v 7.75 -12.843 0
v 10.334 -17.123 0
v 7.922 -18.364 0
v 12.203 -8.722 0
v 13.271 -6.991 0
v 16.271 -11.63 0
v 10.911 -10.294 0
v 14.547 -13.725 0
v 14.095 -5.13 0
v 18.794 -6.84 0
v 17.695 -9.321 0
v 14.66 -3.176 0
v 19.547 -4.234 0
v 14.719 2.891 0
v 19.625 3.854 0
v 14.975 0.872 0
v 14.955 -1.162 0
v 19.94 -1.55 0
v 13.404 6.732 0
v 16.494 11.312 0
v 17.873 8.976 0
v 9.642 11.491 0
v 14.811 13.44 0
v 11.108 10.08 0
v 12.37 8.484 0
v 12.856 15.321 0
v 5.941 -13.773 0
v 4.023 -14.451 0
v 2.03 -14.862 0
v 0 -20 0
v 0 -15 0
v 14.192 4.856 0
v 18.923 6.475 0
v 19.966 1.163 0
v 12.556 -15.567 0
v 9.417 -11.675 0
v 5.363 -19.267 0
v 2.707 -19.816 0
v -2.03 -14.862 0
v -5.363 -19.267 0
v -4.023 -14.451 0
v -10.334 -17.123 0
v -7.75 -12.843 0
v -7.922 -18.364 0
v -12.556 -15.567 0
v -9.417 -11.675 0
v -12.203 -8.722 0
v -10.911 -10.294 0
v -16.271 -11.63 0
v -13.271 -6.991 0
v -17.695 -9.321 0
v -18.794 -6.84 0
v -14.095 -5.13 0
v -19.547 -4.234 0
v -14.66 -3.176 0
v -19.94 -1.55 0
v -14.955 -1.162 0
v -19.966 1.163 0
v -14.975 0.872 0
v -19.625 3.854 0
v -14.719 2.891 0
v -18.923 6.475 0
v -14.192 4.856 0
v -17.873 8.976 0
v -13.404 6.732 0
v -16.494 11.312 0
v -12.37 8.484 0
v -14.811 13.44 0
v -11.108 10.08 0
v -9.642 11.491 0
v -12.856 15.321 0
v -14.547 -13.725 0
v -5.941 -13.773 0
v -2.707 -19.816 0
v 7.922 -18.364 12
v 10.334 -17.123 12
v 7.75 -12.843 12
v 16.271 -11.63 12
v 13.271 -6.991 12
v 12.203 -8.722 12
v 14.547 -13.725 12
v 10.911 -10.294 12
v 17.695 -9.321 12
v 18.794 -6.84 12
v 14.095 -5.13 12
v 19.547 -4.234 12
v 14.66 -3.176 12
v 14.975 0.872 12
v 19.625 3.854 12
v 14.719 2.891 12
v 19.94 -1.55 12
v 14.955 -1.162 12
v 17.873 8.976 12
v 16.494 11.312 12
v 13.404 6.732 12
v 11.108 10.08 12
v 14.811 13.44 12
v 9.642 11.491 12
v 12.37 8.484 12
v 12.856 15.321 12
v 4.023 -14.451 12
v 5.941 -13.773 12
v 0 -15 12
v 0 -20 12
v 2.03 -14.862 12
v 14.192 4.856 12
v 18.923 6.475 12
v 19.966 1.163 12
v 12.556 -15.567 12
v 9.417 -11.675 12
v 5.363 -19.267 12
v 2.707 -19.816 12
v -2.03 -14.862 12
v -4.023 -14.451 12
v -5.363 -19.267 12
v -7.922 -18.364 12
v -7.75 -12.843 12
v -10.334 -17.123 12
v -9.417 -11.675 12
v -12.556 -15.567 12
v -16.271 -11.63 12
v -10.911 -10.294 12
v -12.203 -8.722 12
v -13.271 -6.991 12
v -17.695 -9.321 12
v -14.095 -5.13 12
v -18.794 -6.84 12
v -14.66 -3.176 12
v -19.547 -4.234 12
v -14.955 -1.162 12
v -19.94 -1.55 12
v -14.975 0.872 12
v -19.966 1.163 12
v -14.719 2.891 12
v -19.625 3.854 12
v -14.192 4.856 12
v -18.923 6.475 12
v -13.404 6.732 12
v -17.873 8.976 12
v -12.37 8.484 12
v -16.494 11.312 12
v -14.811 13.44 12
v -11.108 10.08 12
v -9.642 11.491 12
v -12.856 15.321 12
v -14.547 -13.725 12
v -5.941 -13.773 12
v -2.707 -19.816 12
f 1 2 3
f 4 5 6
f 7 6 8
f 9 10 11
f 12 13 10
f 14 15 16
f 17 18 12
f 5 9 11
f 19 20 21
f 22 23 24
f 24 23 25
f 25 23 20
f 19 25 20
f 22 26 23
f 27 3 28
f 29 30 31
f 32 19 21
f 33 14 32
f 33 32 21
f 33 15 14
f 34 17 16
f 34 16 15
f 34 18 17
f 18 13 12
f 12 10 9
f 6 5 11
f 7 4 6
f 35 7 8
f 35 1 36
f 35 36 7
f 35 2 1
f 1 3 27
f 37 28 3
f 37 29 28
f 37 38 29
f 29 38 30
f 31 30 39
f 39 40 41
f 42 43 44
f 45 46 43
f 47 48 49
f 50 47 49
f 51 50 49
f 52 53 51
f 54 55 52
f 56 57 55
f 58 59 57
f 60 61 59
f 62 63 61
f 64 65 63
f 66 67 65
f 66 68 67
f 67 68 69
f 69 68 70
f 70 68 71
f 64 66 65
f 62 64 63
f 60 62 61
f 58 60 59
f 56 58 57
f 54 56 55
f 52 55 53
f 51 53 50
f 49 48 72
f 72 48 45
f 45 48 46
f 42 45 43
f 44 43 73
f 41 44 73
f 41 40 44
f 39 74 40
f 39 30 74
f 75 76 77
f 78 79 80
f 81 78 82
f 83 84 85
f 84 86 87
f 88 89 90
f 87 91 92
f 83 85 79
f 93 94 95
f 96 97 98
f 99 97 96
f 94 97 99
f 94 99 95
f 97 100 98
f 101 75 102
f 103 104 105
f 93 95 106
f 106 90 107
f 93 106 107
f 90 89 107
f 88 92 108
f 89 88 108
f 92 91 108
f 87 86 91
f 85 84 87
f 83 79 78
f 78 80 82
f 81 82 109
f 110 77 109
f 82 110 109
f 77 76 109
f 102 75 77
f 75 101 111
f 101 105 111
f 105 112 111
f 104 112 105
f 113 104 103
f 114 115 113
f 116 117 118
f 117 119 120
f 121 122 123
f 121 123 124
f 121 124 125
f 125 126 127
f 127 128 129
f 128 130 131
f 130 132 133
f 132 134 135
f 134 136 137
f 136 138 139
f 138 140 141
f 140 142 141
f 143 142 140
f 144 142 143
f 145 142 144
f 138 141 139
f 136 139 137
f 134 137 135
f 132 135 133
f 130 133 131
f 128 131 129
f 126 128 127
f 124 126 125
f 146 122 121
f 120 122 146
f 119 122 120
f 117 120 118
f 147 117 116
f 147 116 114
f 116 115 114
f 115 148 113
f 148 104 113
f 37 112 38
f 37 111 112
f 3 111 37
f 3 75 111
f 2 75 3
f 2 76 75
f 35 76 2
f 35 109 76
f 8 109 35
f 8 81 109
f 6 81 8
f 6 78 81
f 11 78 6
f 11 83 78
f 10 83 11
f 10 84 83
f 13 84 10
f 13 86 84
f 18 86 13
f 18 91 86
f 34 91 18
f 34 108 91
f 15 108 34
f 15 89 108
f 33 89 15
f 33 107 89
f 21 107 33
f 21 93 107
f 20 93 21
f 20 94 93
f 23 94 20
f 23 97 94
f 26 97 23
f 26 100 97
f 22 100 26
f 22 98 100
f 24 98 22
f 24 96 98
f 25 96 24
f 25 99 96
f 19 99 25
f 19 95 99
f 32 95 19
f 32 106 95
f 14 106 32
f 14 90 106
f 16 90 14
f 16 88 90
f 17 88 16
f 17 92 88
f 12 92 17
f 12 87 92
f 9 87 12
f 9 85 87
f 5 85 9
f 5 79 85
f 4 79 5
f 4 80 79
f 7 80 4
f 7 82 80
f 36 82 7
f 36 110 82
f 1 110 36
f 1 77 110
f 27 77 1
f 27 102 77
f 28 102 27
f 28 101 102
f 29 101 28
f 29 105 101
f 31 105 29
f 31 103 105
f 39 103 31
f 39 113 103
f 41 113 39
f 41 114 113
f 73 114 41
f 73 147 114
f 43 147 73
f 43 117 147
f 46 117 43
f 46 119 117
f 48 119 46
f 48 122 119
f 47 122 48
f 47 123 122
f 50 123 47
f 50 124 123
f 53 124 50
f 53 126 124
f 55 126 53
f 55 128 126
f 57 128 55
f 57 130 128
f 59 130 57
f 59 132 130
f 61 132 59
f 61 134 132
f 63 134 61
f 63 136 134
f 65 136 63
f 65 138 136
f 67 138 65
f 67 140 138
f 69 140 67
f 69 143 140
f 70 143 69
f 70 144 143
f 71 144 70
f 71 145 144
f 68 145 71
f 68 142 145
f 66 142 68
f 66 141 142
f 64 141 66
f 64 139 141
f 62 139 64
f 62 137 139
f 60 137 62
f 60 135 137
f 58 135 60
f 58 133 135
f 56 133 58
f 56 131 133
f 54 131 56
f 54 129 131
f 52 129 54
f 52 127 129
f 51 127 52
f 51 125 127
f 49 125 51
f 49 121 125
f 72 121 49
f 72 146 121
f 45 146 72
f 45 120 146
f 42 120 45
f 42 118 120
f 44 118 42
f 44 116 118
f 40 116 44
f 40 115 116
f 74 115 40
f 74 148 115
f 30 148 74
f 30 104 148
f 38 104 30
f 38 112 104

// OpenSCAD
$fn = 32;

// ----------------------------------------------------------------------
// Spring clip: 40 mm outside, 5 mm band, 80 degree opening
// ----------------------------------------------------------------------

// --- parameters (mm) ---
outer_r = 20;             // clip outside radius
inner_r = 15;             // clip bore radius
band = 5;                 // band thickness
clip_w = 12;              // clip width
opening = 80;             // opening angle

clip_profile = [[-12.856, 15.321], [-14.811, 13.44], [-16.494, 11.312], [-17.873, 8.976], [-18.923, 6.475], [-19.625, 3.854], [-19.966, 1.163], [-19.94, -1.55], [-19.547, -4.234], [-18.794, -6.84], [-17.695, -9.321], [-16.271, -11.63], [-14.547, -13.725], [-12.556, -15.567], [-10.334, -17.123], [-7.922, -18.364], [-5.363, -19.267], [-2.707, -19.816], [0, -20], [2.707, -19.816], [5.363, -19.267], [7.922, -18.364], [10.334, -17.123], [12.556, -15.567], [14.547, -13.725], [16.271, -11.63], [17.695, -9.321], [18.794, -6.84], [19.547, -4.234], [19.94, -1.55], [19.966, 1.163], [19.625, 3.854], [18.923, 6.475], [17.873, 8.976], [16.494, 11.312], [14.811, 13.44], [12.856, 15.321], [9.642, 11.491], [11.108, 10.08], [12.37, 8.484], [13.404, 6.732], [14.192, 4.856], [14.719, 2.891], [14.975, 0.872], [14.955, -1.162], [14.66, -3.176], [14.095, -5.13], [13.271, -6.991], [12.203, -8.722], [10.911, -10.294], [9.417, -11.675], [7.75, -12.843], [5.941, -13.773], [4.023, -14.451], [2.03, -14.862], [0, -15], [-2.03, -14.862], [-4.023, -14.451], [-5.941, -13.773], [-7.75, -12.843], [-9.417, -11.675], [-10.911, -10.294], [-12.203, -8.722], [-13.271, -6.991], [-14.095, -5.13], [-14.66, -3.176], [-14.955, -1.162], [-14.975, 0.872], [-14.719, 2.891], [-14.192, 4.856], [-13.404, 6.732], [-12.37, 8.484], [-11.108, 10.08], [-9.642, 11.491]];

difference() {
  union() {
    linear_extrude(height = clip_w) polygon(clip_profile);
  }
}
